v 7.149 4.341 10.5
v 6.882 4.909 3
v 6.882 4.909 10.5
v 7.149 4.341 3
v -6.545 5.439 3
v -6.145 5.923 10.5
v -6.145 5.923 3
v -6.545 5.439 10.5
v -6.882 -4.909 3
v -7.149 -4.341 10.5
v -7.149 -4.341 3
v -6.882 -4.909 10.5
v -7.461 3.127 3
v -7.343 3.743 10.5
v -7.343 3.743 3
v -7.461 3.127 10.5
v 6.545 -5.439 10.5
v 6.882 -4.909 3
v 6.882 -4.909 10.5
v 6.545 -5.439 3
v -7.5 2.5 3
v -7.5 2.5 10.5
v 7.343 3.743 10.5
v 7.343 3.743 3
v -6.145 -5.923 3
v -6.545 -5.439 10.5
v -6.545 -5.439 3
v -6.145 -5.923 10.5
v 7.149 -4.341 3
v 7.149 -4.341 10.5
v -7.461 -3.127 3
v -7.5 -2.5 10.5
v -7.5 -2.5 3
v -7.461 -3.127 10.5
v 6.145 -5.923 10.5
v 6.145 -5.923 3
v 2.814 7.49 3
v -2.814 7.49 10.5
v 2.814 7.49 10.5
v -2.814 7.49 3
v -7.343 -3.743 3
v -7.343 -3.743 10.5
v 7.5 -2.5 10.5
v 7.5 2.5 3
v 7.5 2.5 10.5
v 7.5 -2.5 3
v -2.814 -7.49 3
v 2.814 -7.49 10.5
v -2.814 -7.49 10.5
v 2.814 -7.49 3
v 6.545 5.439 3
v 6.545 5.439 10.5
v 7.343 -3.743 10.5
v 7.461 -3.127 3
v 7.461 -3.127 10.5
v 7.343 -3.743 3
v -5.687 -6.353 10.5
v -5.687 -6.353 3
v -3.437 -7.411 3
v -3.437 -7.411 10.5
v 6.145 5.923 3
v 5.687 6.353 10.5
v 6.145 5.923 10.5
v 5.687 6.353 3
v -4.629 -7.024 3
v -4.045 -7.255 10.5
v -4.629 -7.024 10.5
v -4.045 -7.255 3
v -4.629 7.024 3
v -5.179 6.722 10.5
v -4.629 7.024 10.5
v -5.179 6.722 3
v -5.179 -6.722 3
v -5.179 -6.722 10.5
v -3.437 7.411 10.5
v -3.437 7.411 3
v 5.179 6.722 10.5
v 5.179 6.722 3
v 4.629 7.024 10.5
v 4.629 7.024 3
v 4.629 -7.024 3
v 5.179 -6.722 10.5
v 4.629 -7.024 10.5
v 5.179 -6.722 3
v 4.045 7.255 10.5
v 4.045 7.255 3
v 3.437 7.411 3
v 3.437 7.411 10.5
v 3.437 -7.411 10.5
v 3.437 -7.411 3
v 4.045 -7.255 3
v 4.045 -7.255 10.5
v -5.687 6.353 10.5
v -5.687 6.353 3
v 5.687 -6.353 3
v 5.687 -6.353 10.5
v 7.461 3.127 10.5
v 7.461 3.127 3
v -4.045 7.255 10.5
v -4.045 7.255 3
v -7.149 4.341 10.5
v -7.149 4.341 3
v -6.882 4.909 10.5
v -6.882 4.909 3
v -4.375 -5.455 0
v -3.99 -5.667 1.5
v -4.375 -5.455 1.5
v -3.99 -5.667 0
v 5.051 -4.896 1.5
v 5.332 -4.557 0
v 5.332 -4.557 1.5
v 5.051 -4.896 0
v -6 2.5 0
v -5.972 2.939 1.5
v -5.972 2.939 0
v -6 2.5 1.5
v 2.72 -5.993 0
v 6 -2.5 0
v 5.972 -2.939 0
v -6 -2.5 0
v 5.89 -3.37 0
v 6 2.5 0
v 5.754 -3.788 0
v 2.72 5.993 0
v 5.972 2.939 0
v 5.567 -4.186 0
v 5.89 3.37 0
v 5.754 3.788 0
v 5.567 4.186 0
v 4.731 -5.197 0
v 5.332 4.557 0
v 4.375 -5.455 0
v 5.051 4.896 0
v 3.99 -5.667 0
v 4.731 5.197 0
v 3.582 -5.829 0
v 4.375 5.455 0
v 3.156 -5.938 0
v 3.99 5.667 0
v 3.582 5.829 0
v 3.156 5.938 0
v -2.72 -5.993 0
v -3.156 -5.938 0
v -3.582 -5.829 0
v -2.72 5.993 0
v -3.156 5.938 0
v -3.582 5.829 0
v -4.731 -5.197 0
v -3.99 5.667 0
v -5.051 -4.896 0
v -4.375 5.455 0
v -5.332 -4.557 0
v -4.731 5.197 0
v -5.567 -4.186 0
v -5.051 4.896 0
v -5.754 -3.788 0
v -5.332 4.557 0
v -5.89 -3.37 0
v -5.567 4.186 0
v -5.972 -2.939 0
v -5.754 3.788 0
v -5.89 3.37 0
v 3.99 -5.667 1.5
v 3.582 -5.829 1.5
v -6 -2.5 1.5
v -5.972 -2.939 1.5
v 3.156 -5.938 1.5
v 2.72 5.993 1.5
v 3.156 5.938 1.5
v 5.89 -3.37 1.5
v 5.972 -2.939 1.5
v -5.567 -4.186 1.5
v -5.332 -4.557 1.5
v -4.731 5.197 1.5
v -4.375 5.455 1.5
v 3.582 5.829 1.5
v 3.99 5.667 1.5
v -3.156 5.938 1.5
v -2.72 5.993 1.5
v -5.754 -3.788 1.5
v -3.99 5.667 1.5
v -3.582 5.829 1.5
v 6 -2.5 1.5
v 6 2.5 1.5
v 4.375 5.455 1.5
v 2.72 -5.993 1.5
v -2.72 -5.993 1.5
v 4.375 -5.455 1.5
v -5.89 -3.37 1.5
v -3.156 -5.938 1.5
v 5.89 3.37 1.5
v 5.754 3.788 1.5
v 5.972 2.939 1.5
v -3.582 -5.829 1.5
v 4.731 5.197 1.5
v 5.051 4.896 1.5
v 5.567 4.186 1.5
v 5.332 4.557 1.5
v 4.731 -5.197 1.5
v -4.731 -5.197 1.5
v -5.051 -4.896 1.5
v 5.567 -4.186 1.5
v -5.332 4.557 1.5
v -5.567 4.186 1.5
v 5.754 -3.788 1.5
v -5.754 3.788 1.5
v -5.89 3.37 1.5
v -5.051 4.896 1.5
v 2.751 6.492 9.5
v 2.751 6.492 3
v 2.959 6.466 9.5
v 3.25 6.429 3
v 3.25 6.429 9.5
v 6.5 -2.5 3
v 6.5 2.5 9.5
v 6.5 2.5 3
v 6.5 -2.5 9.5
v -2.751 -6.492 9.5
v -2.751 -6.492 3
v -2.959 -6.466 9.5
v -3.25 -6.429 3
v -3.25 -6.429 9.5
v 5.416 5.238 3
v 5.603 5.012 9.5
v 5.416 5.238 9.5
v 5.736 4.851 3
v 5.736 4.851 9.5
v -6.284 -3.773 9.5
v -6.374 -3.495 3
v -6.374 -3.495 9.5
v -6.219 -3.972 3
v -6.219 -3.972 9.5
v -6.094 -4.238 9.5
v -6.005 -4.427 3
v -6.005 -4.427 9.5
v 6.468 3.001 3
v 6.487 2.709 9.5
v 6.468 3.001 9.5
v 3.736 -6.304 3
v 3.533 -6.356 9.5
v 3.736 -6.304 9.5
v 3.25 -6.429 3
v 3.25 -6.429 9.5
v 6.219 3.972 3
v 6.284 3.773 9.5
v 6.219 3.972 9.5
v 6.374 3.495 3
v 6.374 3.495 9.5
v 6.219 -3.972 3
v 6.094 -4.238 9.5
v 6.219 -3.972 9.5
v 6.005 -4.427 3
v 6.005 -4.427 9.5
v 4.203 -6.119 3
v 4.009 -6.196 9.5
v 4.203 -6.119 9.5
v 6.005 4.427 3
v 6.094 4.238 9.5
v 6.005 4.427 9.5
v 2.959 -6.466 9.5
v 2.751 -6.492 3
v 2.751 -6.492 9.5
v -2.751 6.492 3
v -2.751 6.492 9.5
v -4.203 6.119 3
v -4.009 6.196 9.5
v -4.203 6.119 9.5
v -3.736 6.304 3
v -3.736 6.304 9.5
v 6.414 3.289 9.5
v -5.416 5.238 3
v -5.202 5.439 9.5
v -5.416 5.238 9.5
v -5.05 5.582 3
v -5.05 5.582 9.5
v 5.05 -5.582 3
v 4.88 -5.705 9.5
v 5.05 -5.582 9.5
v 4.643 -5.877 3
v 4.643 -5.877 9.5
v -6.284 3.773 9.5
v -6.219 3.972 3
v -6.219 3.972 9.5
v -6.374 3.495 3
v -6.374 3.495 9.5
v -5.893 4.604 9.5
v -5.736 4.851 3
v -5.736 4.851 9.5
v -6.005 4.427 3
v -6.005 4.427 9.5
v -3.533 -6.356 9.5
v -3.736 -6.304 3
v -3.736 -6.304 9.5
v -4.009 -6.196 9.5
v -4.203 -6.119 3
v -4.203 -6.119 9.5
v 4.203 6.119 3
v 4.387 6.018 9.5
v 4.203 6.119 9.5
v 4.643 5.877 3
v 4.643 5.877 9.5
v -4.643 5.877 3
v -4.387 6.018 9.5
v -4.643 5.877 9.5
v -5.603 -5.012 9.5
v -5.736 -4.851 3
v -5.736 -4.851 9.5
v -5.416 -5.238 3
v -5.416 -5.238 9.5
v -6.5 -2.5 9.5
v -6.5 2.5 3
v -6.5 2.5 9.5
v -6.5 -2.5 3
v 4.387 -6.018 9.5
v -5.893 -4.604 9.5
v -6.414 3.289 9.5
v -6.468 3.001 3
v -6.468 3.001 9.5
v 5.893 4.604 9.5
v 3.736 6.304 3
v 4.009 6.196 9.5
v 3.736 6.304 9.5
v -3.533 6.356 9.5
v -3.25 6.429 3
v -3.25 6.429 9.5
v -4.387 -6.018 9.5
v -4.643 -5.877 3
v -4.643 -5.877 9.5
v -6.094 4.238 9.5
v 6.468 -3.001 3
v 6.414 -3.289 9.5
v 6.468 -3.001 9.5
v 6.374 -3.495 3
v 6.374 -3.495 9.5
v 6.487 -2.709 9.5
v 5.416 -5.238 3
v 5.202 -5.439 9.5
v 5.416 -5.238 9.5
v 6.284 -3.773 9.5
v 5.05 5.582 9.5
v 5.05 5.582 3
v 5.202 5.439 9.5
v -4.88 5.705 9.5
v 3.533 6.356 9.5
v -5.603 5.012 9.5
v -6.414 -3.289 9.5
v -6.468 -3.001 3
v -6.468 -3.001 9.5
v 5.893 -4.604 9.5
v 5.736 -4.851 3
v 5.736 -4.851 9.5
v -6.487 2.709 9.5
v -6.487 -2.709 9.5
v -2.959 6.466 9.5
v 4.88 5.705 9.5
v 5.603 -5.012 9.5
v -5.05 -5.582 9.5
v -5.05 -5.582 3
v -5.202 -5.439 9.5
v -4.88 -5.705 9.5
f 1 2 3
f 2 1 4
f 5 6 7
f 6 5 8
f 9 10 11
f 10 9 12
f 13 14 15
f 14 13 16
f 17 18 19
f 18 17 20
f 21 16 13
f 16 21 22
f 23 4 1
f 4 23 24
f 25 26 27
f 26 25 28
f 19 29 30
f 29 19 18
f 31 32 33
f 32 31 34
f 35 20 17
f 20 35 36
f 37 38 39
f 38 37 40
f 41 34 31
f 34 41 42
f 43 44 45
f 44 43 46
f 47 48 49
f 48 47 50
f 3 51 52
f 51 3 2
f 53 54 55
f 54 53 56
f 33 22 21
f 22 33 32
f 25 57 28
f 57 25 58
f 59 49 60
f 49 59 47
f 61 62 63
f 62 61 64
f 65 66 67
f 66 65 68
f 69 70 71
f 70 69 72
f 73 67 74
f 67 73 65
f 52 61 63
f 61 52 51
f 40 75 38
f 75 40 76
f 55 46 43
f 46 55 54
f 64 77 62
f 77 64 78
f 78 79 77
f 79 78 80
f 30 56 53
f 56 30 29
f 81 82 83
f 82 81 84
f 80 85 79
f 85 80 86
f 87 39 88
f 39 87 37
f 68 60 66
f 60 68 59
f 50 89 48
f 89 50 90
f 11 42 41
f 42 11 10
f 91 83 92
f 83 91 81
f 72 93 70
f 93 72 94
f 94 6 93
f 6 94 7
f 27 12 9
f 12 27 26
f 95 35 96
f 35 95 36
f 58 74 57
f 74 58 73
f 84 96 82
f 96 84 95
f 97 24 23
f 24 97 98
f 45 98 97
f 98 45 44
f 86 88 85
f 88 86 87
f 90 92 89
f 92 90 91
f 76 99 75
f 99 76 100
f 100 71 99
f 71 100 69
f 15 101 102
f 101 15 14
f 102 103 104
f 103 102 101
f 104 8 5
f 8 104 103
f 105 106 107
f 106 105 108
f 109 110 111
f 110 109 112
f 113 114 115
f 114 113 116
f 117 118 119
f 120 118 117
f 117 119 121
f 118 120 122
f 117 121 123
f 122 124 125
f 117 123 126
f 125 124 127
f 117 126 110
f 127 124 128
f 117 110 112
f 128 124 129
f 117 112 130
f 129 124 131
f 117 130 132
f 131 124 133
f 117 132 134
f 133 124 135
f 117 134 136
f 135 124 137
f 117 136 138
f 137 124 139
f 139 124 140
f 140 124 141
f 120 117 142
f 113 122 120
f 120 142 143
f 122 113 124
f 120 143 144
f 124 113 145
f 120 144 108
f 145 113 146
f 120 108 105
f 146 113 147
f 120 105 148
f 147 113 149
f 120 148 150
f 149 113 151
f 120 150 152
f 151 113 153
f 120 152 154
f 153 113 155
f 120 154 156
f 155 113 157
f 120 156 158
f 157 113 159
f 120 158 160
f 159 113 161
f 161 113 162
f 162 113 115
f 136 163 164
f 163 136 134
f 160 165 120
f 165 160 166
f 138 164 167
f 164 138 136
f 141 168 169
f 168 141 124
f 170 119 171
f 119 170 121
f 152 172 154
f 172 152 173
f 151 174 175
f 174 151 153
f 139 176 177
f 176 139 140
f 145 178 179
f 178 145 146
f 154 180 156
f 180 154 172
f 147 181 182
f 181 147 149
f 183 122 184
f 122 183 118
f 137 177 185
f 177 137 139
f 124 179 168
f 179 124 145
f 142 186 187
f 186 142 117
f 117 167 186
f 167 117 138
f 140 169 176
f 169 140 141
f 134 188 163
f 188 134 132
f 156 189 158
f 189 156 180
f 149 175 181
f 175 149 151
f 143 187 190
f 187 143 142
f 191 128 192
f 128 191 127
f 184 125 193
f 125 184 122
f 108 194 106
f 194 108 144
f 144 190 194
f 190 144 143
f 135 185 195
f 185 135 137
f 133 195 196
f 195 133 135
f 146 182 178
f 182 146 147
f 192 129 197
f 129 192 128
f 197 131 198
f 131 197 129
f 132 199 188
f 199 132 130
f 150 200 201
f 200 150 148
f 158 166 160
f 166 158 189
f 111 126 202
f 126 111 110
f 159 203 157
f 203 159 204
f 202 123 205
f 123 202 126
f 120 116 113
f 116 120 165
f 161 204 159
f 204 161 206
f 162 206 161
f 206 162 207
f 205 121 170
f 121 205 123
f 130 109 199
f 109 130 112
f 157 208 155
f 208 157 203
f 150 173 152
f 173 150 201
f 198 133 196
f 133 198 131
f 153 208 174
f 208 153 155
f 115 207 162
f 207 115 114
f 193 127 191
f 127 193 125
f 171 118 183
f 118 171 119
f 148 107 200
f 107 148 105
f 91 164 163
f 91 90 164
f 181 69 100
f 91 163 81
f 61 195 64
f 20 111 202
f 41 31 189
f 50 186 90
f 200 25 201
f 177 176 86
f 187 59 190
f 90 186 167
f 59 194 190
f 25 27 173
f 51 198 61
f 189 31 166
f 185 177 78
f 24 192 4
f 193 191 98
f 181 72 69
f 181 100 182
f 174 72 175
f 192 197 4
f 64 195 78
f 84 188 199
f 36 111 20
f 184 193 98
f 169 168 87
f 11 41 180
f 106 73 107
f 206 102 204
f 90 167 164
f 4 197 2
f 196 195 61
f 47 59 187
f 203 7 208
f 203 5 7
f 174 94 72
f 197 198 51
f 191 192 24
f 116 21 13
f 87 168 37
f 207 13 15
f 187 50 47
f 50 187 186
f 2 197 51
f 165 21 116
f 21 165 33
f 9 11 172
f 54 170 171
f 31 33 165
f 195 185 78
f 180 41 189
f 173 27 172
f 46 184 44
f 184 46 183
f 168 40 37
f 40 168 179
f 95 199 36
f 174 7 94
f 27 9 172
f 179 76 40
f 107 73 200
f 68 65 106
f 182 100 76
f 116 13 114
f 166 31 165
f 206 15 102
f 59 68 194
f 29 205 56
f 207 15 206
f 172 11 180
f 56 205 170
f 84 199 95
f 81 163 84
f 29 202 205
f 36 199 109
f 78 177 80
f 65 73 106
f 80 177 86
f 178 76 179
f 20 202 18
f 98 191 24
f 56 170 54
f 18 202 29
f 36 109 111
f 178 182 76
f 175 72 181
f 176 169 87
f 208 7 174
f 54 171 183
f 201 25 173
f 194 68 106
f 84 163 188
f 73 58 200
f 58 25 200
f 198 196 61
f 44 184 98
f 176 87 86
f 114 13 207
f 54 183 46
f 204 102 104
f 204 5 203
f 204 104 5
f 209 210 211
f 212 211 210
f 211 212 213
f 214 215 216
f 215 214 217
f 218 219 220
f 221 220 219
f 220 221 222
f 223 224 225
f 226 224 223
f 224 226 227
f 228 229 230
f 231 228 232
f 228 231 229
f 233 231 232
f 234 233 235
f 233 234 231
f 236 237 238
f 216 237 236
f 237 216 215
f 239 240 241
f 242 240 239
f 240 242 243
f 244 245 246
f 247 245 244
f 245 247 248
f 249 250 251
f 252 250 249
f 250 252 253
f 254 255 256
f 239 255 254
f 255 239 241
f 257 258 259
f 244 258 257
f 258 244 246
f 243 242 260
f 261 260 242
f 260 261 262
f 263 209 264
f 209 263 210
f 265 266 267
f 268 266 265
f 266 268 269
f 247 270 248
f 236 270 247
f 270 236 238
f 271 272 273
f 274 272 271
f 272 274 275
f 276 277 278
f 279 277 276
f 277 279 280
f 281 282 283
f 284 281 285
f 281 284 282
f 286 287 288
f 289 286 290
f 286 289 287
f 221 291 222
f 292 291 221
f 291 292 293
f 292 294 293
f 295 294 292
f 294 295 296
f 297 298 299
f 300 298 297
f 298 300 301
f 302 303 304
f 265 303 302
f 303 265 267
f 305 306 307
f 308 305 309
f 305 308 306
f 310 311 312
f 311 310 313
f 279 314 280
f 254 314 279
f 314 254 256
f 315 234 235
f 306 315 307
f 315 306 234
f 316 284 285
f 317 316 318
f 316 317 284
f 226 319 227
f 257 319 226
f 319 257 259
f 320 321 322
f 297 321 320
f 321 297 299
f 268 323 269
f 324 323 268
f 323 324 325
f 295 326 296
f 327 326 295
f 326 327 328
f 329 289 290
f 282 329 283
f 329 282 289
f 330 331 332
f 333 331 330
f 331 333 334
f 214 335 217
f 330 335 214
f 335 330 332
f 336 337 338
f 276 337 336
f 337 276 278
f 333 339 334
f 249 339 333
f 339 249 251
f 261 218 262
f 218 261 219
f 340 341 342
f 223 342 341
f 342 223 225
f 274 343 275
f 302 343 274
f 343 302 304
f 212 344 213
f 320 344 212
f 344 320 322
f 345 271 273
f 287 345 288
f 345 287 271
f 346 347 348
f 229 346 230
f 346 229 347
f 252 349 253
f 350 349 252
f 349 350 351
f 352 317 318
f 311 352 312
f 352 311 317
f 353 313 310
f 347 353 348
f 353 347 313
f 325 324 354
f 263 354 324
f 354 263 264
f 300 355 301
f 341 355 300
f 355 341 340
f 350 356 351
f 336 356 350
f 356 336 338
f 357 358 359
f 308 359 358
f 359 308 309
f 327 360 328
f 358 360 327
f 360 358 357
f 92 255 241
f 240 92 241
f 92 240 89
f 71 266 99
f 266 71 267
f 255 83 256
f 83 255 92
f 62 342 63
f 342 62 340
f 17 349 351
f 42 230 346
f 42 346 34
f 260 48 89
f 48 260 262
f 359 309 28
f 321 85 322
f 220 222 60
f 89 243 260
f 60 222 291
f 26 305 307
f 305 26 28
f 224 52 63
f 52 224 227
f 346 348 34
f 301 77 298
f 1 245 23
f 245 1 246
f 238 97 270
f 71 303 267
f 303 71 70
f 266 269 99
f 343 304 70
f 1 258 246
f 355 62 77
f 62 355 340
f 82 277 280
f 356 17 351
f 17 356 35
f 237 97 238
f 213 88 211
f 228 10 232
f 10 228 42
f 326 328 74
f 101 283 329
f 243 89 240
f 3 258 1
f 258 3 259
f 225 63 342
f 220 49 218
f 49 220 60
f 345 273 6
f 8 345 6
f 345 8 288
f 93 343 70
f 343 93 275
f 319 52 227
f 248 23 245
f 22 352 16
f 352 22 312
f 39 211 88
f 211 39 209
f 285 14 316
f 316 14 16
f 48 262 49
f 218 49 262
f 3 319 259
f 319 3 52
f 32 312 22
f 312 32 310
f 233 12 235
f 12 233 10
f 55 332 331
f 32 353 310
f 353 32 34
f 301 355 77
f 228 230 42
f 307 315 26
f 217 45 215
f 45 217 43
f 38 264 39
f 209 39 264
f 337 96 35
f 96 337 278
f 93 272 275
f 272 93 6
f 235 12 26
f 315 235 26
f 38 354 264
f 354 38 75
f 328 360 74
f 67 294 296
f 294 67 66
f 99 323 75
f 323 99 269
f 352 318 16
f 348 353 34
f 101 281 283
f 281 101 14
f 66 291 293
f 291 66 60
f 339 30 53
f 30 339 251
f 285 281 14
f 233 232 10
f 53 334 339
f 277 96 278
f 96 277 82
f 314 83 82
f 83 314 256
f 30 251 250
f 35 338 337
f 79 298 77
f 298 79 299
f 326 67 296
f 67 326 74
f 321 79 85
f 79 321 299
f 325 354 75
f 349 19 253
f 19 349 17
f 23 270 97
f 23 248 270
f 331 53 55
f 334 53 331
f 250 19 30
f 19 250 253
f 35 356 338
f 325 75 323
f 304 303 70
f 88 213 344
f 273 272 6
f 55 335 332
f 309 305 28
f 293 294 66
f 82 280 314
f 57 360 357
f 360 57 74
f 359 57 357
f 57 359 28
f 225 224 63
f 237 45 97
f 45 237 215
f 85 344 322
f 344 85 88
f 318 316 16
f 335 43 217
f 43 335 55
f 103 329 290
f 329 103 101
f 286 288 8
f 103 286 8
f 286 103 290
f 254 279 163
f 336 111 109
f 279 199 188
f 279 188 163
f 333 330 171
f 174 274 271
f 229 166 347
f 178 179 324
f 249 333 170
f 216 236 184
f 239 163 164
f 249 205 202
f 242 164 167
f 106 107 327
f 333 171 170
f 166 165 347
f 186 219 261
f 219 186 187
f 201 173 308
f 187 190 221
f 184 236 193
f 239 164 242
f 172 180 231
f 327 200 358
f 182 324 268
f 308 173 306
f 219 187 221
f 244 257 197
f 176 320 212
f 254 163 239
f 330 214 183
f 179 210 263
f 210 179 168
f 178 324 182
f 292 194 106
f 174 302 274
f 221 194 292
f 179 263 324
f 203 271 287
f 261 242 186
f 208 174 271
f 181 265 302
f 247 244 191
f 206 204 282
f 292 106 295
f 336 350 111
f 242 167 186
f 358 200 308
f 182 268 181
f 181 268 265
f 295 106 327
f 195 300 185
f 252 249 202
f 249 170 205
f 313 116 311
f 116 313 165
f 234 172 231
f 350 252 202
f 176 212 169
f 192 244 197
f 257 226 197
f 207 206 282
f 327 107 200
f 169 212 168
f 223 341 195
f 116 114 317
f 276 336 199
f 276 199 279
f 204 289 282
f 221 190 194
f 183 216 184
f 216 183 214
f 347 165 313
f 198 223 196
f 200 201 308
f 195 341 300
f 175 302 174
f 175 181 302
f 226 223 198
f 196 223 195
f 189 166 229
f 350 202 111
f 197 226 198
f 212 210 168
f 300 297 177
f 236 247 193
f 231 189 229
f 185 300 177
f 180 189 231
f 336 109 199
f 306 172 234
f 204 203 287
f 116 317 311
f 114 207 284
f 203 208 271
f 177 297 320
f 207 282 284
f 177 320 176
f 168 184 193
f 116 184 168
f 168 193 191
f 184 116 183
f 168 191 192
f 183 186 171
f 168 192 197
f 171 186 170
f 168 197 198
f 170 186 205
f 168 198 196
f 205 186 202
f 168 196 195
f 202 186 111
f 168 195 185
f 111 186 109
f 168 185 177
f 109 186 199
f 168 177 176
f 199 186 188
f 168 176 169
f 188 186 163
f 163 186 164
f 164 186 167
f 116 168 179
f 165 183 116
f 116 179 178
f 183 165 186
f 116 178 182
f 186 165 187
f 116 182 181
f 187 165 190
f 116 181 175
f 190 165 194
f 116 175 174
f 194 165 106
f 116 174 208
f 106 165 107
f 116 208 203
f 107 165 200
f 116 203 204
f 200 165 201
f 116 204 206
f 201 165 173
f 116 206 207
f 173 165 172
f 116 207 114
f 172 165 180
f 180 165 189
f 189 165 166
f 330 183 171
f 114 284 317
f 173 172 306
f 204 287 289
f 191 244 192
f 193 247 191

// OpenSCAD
$fn = 50;


difference() {
	union() {
		translate(v = [0, 0, 3.0000000000]) {
			hull() {
				translate(v = [-2.5000000000, 2.5000000000, 0]) {
					cylinder(h = 7.5000000000, r = 5);
				}
				translate(v = [2.5000000000, 2.5000000000, 0]) {
					cylinder(h = 7.5000000000, r = 5);
				}
				translate(v = [-2.5000000000, -2.5000000000, 0]) {
					cylinder(h = 7.5000000000, r = 5);
				}
				translate(v = [2.5000000000, -2.5000000000, 0]) {
					cylinder(h = 7.5000000000, r = 5);
				}
			}
		}
		hull() {
			translate(v = [-2.5000000000, 2.5000000000, 0]) {
				cylinder(h = 1.5000000000, r = 3.5000000000);
			}
			translate(v = [2.5000000000, 2.5000000000, 0]) {
				cylinder(h = 1.5000000000, r = 3.5000000000);
			}
			translate(v = [-2.5000000000, -2.5000000000, 0]) {
				cylinder(h = 1.5000000000, r = 3.5000000000);
			}
			translate(v = [2.5000000000, -2.5000000000, 0]) {
				cylinder(h = 1.5000000000, r = 3.5000000000);
			}
		}
		translate(v = [0, 0, 1.5000000000]) {
			hull() {
				translate(v = [-2.5000000000, 2.5000000000, 0]) {
					cylinder(h = 1.5000000000, r = 5, r1 = 3.5000000000, r2 = 5);
				}
				translate(v = [2.5000000000, 2.5000000000, 0]) {
					cylinder(h = 1.5000000000, r = 5, r1 = 3.5000000000, r2 = 5);
				}
				translate(v = [-2.5000000000, -2.5000000000, 0]) {
					cylinder(h = 1.5000000000, r = 5, r1 = 3.5000000000, r2 = 5);
				}
				translate(v = [2.5000000000, -2.5000000000, 0]) {
					cylinder(h = 1.5000000000, r = 5, r1 = 3.5000000000, r2 = 5);
				}
			}
		}
	}
	union() {
		translate(v = [0, 0, 3.0000000000]) {
			hull() {
				translate(v = [-2.5000000000, 2.5000000000, 0]) {
					cylinder(h = 7.5000000000, r = 4);
				}
				translate(v = [2.5000000000, 2.5000000000, 0]) {
					cylinder(h = 7.5000000000, r = 4);
				}
				translate(v = [-2.5000000000, -2.5000000000, 0]) {
					cylinder(h = 7.5000000000, r = 4);
				}
				translate(v = [2.5000000000, -2.5000000000, 0]) {
					cylinder(h = 7.5000000000, r = 4);
				}
			}
		}
		translate(v = [0, 0, 9]) {
			hull() {
				translate(v = [-2.5000000000, 2.5000000000, 0]) {
					cylinder(h = 1.5000000000, r = 5, r1 = 3.5000000000, r2 = 5);
				}
				translate(v = [2.5000000000, 2.5000000000, 0]) {
					cylinder(h = 1.5000000000, r = 5, r1 = 3.5000000000, r2 = 5);
				}
				translate(v = [-2.5000000000, -2.5000000000, 0]) {
					cylinder(h = 1.5000000000, r = 5, r1 = 3.5000000000, r2 = 5);
				}
				translate(v = [2.5000000000, -2.5000000000, 0]) {
					cylinder(h = 1.5000000000, r = 5, r1 = 3.5000000000, r2 = 5);
				}
			}
		}
		translate(v = [0, 0, 1.5000000000]) {
			hull() {
				translate(v = [-2.5000000000, 2.5000000000, 0]) {
					cylinder(h = 1.5000000000, r = 5, r1 = 3.5000000000, r2 = 4);
				}
				translate(v = [2.5000000000, 2.5000000000, 0]) {
					cylinder(h = 1.5000000000, r = 5, r1 = 3.5000000000, r2 = 4);
				}
				translate(v = [-2.5000000000, -2.5000000000, 0]) {
					cylinder(h = 1.5000000000, r = 5, r1 = 3.5000000000, r2 = 4);
				}
				translate(v = [2.5000000000, -2.5000000000, 0]) {
					cylinder(h = 1.5000000000, r = 5, r1 = 3.5000000000, r2 = 4);
				}
			}
		}
	}
}
